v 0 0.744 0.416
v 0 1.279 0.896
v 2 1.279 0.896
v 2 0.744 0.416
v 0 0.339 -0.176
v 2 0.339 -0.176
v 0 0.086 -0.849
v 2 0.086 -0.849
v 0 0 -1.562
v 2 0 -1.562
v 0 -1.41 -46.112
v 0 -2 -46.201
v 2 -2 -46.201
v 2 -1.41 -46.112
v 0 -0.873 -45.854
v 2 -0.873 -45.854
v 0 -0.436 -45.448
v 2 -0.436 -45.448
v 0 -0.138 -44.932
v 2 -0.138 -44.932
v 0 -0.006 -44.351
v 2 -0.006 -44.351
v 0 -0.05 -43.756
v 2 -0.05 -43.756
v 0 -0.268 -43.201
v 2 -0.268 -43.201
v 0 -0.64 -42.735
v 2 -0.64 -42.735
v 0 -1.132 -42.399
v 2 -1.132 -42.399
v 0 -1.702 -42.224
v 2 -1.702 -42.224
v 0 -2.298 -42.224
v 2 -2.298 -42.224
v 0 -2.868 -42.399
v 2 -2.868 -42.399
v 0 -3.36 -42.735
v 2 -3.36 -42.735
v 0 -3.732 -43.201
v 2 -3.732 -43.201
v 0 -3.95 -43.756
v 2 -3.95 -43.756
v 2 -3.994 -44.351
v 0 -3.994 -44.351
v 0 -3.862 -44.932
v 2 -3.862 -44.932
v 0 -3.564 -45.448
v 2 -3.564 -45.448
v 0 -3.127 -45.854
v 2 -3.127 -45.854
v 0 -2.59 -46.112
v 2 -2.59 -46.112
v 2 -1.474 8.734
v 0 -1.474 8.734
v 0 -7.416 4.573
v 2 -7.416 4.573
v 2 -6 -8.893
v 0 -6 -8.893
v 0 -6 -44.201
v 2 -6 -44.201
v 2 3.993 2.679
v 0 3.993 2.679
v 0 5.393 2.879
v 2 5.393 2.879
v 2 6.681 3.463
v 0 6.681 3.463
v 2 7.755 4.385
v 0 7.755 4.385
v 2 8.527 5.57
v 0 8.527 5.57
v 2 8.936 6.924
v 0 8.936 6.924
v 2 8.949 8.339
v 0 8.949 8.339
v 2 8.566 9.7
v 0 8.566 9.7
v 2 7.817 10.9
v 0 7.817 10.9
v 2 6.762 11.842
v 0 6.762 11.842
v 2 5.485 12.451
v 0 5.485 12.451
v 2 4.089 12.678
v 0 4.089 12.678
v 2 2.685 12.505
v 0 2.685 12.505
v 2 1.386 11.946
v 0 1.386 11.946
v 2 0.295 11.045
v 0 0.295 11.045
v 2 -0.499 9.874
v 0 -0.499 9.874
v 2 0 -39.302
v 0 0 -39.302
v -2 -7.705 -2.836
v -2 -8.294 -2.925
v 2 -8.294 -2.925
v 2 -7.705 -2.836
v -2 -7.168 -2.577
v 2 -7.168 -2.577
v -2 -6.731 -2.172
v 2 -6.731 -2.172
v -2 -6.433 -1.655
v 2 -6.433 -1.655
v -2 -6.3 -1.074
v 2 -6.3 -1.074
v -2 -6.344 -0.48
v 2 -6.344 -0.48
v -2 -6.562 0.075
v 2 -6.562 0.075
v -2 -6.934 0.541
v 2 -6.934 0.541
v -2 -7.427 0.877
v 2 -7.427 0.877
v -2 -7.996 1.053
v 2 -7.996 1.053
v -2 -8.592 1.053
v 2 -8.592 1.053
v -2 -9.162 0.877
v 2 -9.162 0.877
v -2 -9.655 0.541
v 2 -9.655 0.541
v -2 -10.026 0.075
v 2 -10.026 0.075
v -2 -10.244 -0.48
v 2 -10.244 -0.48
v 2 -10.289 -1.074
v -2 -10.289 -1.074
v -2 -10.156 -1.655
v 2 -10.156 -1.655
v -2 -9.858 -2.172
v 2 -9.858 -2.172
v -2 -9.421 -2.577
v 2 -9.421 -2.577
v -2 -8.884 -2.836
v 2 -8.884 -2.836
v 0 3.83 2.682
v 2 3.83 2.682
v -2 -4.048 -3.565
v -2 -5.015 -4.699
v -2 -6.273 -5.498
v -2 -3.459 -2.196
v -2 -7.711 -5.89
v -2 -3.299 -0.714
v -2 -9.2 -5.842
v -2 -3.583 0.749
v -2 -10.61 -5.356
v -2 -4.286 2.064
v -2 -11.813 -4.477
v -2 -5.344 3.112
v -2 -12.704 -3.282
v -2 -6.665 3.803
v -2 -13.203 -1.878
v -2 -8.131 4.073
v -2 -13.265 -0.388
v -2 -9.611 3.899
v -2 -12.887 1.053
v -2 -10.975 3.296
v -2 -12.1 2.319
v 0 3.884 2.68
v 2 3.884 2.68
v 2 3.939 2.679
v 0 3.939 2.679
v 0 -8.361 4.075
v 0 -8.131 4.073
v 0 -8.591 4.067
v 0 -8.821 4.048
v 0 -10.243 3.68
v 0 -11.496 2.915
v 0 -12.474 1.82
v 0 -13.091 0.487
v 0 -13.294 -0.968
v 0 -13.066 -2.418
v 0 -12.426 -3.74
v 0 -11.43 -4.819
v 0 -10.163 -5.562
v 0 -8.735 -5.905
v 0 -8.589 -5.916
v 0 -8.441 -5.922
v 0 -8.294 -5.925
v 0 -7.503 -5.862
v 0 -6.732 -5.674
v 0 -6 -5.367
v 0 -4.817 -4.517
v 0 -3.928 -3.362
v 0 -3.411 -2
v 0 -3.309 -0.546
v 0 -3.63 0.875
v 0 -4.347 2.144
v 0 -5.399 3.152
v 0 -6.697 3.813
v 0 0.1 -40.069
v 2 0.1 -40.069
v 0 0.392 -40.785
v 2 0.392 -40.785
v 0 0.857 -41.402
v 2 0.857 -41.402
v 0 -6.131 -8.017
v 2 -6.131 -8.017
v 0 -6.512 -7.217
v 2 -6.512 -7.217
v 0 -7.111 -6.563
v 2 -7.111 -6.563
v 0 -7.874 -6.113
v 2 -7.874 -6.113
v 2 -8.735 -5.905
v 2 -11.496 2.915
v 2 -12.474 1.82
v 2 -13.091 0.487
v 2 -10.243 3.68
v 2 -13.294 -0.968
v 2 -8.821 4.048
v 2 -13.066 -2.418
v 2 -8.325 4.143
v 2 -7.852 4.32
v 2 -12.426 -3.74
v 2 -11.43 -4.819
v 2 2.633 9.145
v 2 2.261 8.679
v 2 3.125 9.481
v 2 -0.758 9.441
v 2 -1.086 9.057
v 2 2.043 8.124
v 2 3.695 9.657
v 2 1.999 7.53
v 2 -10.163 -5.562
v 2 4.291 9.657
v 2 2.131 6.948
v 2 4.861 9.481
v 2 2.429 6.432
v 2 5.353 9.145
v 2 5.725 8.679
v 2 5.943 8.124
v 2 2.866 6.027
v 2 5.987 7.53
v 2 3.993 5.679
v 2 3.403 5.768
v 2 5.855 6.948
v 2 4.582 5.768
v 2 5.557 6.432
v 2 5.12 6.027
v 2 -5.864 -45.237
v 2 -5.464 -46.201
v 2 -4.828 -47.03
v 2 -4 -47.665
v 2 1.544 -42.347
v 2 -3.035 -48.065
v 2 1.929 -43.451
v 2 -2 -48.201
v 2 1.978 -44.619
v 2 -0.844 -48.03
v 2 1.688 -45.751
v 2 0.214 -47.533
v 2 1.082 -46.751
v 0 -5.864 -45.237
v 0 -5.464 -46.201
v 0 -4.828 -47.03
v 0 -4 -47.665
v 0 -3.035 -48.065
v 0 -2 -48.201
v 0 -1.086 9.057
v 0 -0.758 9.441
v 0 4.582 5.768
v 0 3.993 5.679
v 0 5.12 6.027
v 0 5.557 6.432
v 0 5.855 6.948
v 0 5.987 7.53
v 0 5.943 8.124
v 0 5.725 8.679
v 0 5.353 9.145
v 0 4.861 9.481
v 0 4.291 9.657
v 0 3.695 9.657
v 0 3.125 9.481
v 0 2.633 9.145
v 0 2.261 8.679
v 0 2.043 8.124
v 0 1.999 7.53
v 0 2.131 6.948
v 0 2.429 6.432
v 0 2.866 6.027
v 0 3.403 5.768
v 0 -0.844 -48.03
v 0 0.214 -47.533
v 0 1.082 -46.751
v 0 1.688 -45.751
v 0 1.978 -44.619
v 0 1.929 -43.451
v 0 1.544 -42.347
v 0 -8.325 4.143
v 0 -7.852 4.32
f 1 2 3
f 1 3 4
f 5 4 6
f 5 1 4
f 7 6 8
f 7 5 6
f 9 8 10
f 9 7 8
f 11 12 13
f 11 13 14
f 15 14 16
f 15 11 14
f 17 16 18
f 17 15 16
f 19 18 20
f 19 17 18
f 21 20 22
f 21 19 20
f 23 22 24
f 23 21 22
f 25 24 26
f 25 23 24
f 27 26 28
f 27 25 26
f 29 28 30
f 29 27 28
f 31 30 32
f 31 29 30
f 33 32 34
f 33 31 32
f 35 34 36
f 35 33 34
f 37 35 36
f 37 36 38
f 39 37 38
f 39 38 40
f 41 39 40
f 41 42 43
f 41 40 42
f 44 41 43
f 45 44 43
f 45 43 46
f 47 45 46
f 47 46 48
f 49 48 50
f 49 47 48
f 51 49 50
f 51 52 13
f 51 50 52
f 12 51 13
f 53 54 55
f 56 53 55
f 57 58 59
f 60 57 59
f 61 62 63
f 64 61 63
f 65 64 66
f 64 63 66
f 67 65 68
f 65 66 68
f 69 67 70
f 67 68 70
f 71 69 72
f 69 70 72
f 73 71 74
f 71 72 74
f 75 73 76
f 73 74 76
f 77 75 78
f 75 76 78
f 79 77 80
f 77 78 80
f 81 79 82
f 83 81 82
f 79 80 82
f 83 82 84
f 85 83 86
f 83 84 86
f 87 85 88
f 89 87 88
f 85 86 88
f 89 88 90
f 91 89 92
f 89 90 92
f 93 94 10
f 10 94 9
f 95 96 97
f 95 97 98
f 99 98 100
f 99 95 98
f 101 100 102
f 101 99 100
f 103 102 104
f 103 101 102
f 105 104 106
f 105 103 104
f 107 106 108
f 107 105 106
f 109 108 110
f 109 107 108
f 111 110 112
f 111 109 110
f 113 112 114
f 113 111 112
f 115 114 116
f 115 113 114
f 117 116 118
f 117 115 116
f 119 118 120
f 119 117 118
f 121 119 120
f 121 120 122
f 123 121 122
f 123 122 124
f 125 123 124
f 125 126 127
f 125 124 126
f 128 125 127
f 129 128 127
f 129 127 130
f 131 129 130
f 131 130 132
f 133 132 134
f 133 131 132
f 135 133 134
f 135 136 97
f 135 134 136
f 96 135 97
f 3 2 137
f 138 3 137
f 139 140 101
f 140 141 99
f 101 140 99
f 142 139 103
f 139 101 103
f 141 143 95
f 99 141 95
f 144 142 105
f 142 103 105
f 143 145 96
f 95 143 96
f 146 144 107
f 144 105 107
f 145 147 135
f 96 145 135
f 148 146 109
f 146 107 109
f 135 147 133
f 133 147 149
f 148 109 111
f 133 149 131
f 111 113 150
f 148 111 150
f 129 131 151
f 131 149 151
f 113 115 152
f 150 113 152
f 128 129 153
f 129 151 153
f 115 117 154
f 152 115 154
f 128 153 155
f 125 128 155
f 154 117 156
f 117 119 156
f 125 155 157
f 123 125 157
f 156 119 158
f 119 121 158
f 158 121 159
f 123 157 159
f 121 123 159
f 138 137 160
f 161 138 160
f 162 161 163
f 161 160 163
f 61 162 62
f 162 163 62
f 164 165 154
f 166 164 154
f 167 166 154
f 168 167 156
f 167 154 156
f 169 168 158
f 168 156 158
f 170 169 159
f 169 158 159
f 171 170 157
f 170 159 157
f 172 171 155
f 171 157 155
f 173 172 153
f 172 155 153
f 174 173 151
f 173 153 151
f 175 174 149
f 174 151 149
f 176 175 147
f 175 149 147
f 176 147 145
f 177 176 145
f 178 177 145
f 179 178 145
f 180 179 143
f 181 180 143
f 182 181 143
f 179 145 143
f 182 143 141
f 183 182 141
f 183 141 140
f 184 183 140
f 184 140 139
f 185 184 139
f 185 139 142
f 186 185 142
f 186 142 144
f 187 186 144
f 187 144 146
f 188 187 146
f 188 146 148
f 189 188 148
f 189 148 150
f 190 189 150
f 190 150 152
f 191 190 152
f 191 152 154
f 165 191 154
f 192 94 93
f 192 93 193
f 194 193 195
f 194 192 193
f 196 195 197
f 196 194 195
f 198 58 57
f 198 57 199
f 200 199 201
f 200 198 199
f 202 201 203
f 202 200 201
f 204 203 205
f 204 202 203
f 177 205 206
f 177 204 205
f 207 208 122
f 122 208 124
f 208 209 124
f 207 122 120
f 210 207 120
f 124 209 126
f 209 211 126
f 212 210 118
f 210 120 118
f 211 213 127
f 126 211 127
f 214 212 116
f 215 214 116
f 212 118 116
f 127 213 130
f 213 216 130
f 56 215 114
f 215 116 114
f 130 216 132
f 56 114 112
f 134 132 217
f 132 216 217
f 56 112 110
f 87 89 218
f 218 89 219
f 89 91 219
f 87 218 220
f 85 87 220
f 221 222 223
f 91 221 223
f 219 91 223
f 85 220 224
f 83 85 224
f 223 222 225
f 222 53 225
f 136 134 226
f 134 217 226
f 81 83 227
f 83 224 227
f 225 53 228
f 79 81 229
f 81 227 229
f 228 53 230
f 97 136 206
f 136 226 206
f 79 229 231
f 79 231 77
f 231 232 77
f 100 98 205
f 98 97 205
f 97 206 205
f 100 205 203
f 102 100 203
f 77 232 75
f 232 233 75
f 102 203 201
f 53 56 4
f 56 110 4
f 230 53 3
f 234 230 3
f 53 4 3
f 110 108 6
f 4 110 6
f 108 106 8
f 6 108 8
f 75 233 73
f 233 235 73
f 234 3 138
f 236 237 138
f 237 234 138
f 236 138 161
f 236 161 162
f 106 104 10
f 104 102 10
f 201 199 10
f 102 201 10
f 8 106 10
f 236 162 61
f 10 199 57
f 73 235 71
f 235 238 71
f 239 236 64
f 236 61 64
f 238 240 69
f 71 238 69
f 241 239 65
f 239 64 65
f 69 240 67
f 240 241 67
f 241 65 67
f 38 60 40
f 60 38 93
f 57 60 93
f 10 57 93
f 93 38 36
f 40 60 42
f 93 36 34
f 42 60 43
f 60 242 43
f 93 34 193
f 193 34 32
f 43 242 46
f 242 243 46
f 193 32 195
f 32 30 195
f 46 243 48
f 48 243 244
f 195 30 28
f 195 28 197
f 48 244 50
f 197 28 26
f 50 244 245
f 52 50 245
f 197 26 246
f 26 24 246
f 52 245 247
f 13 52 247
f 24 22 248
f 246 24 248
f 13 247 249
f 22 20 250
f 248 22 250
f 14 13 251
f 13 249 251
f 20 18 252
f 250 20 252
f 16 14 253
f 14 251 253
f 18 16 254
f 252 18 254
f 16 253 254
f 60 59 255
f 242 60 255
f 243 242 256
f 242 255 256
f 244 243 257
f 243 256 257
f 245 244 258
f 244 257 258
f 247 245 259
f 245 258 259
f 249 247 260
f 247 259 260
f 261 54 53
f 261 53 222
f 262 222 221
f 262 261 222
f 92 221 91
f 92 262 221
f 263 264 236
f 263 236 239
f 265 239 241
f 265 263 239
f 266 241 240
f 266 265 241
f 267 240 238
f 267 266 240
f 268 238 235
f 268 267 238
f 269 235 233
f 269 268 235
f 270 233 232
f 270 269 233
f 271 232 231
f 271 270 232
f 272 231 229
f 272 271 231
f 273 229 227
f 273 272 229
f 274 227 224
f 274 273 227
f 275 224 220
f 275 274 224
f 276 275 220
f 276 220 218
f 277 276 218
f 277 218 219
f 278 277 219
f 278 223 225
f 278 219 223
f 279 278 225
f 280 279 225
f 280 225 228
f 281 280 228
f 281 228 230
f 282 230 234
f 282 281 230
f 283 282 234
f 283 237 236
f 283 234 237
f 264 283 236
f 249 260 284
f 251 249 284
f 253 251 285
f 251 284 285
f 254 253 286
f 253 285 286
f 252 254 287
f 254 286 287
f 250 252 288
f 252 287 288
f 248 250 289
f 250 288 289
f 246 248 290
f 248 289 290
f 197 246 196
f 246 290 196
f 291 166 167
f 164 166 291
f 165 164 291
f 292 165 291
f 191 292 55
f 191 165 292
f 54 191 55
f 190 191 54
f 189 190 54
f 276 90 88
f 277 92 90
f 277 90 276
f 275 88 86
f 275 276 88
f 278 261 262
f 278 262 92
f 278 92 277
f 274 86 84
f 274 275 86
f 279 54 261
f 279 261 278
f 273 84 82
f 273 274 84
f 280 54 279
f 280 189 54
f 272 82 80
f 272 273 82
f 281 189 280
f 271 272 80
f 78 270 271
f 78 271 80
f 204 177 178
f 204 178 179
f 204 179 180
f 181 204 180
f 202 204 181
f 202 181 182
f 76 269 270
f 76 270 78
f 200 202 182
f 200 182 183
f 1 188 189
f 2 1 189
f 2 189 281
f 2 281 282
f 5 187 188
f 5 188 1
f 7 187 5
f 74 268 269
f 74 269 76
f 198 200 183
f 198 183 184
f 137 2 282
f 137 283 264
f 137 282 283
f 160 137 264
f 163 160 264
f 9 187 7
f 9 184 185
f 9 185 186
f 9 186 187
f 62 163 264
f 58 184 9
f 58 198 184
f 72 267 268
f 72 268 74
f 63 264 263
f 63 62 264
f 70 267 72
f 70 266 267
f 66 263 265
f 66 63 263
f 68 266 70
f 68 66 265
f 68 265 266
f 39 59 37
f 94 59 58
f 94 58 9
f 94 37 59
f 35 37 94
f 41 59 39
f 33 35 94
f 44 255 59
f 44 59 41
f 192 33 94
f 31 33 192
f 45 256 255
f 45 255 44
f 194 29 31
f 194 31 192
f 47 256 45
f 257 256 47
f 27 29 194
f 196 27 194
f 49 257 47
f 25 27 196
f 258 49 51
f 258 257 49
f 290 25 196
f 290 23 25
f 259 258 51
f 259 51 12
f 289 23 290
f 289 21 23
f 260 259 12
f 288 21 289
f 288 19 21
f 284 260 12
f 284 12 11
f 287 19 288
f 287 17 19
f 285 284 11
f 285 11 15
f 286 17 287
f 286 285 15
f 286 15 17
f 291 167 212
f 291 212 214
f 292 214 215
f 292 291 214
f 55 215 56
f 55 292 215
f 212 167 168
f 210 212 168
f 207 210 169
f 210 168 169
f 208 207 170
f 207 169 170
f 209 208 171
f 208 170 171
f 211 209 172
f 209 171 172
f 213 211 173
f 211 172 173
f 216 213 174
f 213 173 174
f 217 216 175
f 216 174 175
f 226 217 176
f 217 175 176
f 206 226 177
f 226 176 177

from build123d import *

# Parameters (mm, degrees)
EXTRUDE_1_DEPTH          = 2
EXTRUDE_START            = -2
SKETCH_1_4_R             = 5
EXTRUDE_2_DEPTH          = 2
CUT_EXTRUDE_1_DEPTH      = 51.040969284
CUT_EXTRUDE_1_DEPTH_BACK = 51.040969284
SKETCH_1_3_R             = 2
FILLET_1_R               = 3


with BuildPart() as part:
    # 草图1 → 凸台-拉伸1 (new body)
    with BuildSketch(Plane(origin=(0, 0, 0), x_dir=(0, 0, -1), z_dir=(1, 0, 0))):
        with BuildLine():
            Line((40.737143614, 0), (0, 0))
            Line((0, 0), (2.48051592, -3.542543867))
            ThreePointArc((2.48051592, -3.542543867), (4.165783411, -4.487079684), (5.367176995, -6))
            Line((5.367176995, -6), (44.201245229, -6))
            ThreePointArc((44.201245229, -6), (40.737143614, -4), (40.737143614, 0))
        make_face()
        with BuildLine():
            Line((2.48051592, -3.542543867), (0, 0))
            Line((0, 0), (-2.681672007, 3.829824531))
            ThreePointArc((-2.681672007, 3.829824531), (-4.811127311, -0.102785303), (-9.234888361, -0.758786959))
            Line((-9.234888361, -0.758786959), (-4.072700434, -8.131155358))
            ThreePointArc((-4.072700434, -8.131155358), (-1.94324513, -4.198545524), (2.48051592, -3.542543867))
        make_face()
        with BuildLine():
            ThreePointArc((48.201245229, -2), (45.23652141, 1.863703305), (40.737143614, 0))
            Line((40.737143614, 0), (44.201245229, 0))
            ThreePointArc((44.201245229, 0), (45.615458792, -0.585786438), (46.201245229, -2))
            ThreePointArc((46.201245229, -2), (45.615458792, -3.414213562), (44.201245229, -4))
            Line((44.201245229, -4), (44.201245229, -6))
            ThreePointArc((44.201245229, -6), (47.029672354, -4.828427125), (48.201245229, -2))
        make_face()
        with BuildLine():
            Line((44.201245229, 0), (40.737143614, 0))
            ThreePointArc((40.737143614, 0), (40.737143614, -4), (44.201245229, -6))
            Line((44.201245229, -6), (44.201245229, -4))
            ThreePointArc((44.201245229, -4), (42.201245229, -2), (44.201245229, 0))
        make_face()
        with BuildLine():
            ThreePointArc((5.367176995, -6), (4.165783411, -4.487079684), (2.48051592, -3.542543867))
            Line((2.48051592, -3.542543867), (4.201245229, -6))
            Line((4.201245229, -6), (5.367176995, -6))
        make_face()
        with BuildLine():
            Line((4.201245229, -6), (2.48051592, -3.542543867))
            ThreePointArc((2.48051592, -3.542543867), (-1.94324513, -4.198545524), (-4.072700434, -8.131155358))
            Line((-4.072700434, -8.131155358), (-2.351971125, -10.588611491))
            Line((-2.351971125, -10.588611491), (-0.713667036, -9.441458618))
            ThreePointArc((-0.713667036, -9.441458618), (-0.222515821, -6.656001657), (2.562941141, -7.147152873))
            Line((2.562941141, -7.147152873), (4.201245229, -6))
        make_face()
        with BuildLine():
            ThreePointArc((-9.234888361, -0.758786959), (-4.811127311, -0.102785303), (-2.681672007, 3.829824531))
            Line((-2.681672007, 3.829824531), (-4.402401316, 6.287280664))
            Line((-4.402401316, 6.287280664), (-6.040705405, 5.140127792))
            ThreePointArc((-6.040705405, 5.140127792), (-5.771575592, 4.594386518), (-5.679009493, 3.992974919))
            ThreePointArc((-5.679009493, 3.992974919), (-7.077597894, 2.085541017), (-9.317313582, 2.845822046))
            Line((-9.317313582, 2.845822046), (-10.95561767, 1.698669174))
            Line((-10.95561767, 1.698669174), (-9.234888361, -0.758786959))
        make_face()
        with BuildLine():
            Line((-4.402401316, 6.287280664), (-2.681672007, 3.829824531))
            ThreePointArc((-2.681672007, 3.829824531), (-2.679675166, 3.911388863), (-2.679009493, 3.992974919))
            ThreePointArc((-2.679009493, 3.992974919), (-10.613341245, 8.041394014), (-9.234888361, -0.758786959))
            Line((-9.234888361, -0.758786959), (-10.95561767, 1.698669174))
            Line((-10.95561767, 1.698669174), (-9.317313582, 2.845822046))
            ThreePointArc((-9.317313582, 2.845822046), (-8.826162366, 5.631279008), (-6.040705405, 5.140127792))
            Line((-6.040705405, 5.140127792), (-4.402401316, 6.287280664))
        make_face()
        with BuildLine():
            ThreePointArc((46.201245229, -2), (45.615458792, -0.585786438), (44.201245229, 0))
            Line((44.201245229, 0), (44.201245229, -4))
            ThreePointArc((44.201245229, -4), (45.615458792, -3.414213562), (46.201245229, -2))
        make_face()
        with BuildLine():
            Line((44.201245229, -4), (44.201245229, 0))
            ThreePointArc((44.201245229, 0), (42.201245229, -2), (44.201245229, -4))
        make_face()
        with BuildLine():
            Line((5.367176995, -6), (4.201245229, -6))
            Line((4.201245229, -6), (2.562941141, -7.147152873))
            ThreePointArc((2.562941141, -7.147152873), (2.832070954, -7.692894146), (2.924637052, -8.294305745))
            ThreePointArc((2.924637052, -8.294305745), (1.526048651, -10.201739647), (-0.713667036, -9.441458618))
            Line((-0.713667036, -9.441458618), (-2.351971125, -10.588611491))
            Line((-2.351971125, -10.588611491), (-4.072700434, -8.131155358))
            ThreePointArc((-4.072700434, -8.131155358), (0.843050996, -13.293640073), (5.924637052, -8.294305745))
            ThreePointArc((5.924637052, -8.294305745), (5.783273678, -7.113776143), (5.367176995, -6))
        make_face()
        with BuildLine():
            ThreePointArc((2.924637052, -8.294305745), (2.832070954, -7.692894146), (2.562941141, -7.147152873))
            Line((2.562941141, -7.147152873), (-0.713667036, -9.441458618))
            ThreePointArc((-0.713667036, -9.441458618), (1.526048651, -10.201739647), (2.924637052, -8.294305745))
        make_face()
        with BuildLine():
            Line((-0.713667036, -9.441458618), (2.562941141, -7.147152873))
            ThreePointArc((2.562941141, -7.147152873), (-0.222515821, -6.656001657), (-0.713667036, -9.441458618))
        make_face()
        with BuildLine():
            ThreePointArc((-5.679009493, 3.992974919), (-5.771575592, 4.594386518), (-6.040705405, 5.140127792))
            Line((-6.040705405, 5.140127792), (-9.317313582, 2.845822046))
            ThreePointArc((-9.317313582, 2.845822046), (-7.077597894, 2.085541017), (-5.679009493, 3.992974919))
        make_face()
        with BuildLine():
            Line((-9.317313582, 2.845822046), (-6.040705405, 5.140127792))
            ThreePointArc((-6.040705405, 5.140127792), (-8.826162366, 5.631279008), (-9.317313582, 2.845822046))
        make_face()
    extrude(amount=EXTRUDE_1_DEPTH)

    # 草图1<4> → 凸台-拉伸2 (add)
    with BuildSketch(Plane(origin=(0, 0, 0), x_dir=(0, 0, -1), z_dir=(1, 0, 0)).offset(EXTRUDE_START)):
        with Locations(Location((0.924637052, -8.294305745, 0), (0, 0, 178.130102354))):
            Circle(SKETCH_1_4_R)
    extrude(amount=EXTRUDE_2_DEPTH)

    # 草图1<3> → 切除-拉伸1 (cut, two sides: drawn at the far end of the back side and taken through both)
    with BuildSketch(Plane(origin=(0, 0, 0), x_dir=(0, 0, -1), z_dir=(1, 0, 0)).offset(-CUT_EXTRUDE_1_DEPTH_BACK)):
        with Locations((-7.679009493, 3.992974919)):
            Circle(SKETCH_1_3_R)
        with Locations((44.201245229, -2)):
            Circle(SKETCH_1_3_R)
        with Locations((0.924637052, -8.294305745)):
            Circle(SKETCH_1_3_R)
    extrude(amount=CUT_EXTRUDE_1_DEPTH + CUT_EXTRUDE_1_DEPTH_BACK, mode=Mode.SUBTRACT)

    # 圆角1
    # the kernel refuses this fillet: 3 mm, written as the material it adds along each edge
    with BuildSketch(Plane(origin=(0, -6, -5.367176995), x_dir=(0, 0, -1), z_dir=(1, 0, 0))) as fillet_1_piece_1:
        with BuildLine():
            CenterArc((3.526273997, -3), FILLET_1_R, 90, 84.939259464)
            ThreePointArc((0.53796877, -2.735364655), (0.463478447, -1.329430853), (0, 0))
            Line((0, 0), (3.526273997, 0))
        make_face()
    extrude(amount=2)
    with BuildSketch(Plane(origin=(0, 0, 0), x_dir=(0, 0, -1), z_dir=(1, 0, 0))) as fillet_1_piece_2:
        with BuildLine():
            CenterArc((FILLET_1_R * 0.520567050552, FILLET_1_R), FILLET_1_R, 215, 55)
            Line((-FILLET_1_R * 0.298584993737, FILLET_1_R * 0.426423563649), (0, 0))
            Line((0, 0), (FILLET_1_R * 0.520567050552, 0))
        make_face()
    extrude(amount=2)
    with BuildSketch(Plane(origin=(0, 0, -40.737143614), x_dir=(0, 0.790236885240252, -0.6128014892326752), z_dir=(1, 0, 0))) as fillet_1_piece_3:
        with BuildLine():
            CenterArc((1.49141536, 2.972297887), FILLET_1_R, 217.792345701, 44.415308597)
            Line((-0.879295296, 1.133893419), (0, 0))
            ThreePointArc((0, 0), (0.542332858, 0.036936151), (1.084665716, 0))
        make_face()
    extrude(amount=2)
    with BuildSketch(Plane(origin=(0, -0.758786959, 9.234888361), x_dir=(0, -0.8191520442889745, -0.5735764363510707), z_dir=(1, 0, 0))) as fillet_1_piece_4:
        with BuildLine():
            CenterArc((0.872983346, -3), FILLET_1_R, 90, 28.955024372)
            ThreePointArc((-0.579385409, -0.375), (-0.283214788, -0.19750856), (0, 0))
            Line((0, 0), (0.872983346, 0))
        make_face()
    extrude(amount=2)
    with BuildSketch(Plane(origin=(0, -8.131155358, 4.072700434), x_dir=(0, -0.9993363396246481, -0.03642636827368134), z_dir=(1, 0, 0))) as fillet_1_piece_5:
        with BuildLine():
            CenterArc((0.897200113, -2.992846785), FILLET_1_R, 93.957436637, 28.955024372)
            Line((-0.732871014, -0.474341649), (0, 0))
            ThreePointArc((0, 0), (0.345076967, -0.011922025), (0.690153933, 0))
        make_face()
    extrude(amount=2)


solid = part.part
